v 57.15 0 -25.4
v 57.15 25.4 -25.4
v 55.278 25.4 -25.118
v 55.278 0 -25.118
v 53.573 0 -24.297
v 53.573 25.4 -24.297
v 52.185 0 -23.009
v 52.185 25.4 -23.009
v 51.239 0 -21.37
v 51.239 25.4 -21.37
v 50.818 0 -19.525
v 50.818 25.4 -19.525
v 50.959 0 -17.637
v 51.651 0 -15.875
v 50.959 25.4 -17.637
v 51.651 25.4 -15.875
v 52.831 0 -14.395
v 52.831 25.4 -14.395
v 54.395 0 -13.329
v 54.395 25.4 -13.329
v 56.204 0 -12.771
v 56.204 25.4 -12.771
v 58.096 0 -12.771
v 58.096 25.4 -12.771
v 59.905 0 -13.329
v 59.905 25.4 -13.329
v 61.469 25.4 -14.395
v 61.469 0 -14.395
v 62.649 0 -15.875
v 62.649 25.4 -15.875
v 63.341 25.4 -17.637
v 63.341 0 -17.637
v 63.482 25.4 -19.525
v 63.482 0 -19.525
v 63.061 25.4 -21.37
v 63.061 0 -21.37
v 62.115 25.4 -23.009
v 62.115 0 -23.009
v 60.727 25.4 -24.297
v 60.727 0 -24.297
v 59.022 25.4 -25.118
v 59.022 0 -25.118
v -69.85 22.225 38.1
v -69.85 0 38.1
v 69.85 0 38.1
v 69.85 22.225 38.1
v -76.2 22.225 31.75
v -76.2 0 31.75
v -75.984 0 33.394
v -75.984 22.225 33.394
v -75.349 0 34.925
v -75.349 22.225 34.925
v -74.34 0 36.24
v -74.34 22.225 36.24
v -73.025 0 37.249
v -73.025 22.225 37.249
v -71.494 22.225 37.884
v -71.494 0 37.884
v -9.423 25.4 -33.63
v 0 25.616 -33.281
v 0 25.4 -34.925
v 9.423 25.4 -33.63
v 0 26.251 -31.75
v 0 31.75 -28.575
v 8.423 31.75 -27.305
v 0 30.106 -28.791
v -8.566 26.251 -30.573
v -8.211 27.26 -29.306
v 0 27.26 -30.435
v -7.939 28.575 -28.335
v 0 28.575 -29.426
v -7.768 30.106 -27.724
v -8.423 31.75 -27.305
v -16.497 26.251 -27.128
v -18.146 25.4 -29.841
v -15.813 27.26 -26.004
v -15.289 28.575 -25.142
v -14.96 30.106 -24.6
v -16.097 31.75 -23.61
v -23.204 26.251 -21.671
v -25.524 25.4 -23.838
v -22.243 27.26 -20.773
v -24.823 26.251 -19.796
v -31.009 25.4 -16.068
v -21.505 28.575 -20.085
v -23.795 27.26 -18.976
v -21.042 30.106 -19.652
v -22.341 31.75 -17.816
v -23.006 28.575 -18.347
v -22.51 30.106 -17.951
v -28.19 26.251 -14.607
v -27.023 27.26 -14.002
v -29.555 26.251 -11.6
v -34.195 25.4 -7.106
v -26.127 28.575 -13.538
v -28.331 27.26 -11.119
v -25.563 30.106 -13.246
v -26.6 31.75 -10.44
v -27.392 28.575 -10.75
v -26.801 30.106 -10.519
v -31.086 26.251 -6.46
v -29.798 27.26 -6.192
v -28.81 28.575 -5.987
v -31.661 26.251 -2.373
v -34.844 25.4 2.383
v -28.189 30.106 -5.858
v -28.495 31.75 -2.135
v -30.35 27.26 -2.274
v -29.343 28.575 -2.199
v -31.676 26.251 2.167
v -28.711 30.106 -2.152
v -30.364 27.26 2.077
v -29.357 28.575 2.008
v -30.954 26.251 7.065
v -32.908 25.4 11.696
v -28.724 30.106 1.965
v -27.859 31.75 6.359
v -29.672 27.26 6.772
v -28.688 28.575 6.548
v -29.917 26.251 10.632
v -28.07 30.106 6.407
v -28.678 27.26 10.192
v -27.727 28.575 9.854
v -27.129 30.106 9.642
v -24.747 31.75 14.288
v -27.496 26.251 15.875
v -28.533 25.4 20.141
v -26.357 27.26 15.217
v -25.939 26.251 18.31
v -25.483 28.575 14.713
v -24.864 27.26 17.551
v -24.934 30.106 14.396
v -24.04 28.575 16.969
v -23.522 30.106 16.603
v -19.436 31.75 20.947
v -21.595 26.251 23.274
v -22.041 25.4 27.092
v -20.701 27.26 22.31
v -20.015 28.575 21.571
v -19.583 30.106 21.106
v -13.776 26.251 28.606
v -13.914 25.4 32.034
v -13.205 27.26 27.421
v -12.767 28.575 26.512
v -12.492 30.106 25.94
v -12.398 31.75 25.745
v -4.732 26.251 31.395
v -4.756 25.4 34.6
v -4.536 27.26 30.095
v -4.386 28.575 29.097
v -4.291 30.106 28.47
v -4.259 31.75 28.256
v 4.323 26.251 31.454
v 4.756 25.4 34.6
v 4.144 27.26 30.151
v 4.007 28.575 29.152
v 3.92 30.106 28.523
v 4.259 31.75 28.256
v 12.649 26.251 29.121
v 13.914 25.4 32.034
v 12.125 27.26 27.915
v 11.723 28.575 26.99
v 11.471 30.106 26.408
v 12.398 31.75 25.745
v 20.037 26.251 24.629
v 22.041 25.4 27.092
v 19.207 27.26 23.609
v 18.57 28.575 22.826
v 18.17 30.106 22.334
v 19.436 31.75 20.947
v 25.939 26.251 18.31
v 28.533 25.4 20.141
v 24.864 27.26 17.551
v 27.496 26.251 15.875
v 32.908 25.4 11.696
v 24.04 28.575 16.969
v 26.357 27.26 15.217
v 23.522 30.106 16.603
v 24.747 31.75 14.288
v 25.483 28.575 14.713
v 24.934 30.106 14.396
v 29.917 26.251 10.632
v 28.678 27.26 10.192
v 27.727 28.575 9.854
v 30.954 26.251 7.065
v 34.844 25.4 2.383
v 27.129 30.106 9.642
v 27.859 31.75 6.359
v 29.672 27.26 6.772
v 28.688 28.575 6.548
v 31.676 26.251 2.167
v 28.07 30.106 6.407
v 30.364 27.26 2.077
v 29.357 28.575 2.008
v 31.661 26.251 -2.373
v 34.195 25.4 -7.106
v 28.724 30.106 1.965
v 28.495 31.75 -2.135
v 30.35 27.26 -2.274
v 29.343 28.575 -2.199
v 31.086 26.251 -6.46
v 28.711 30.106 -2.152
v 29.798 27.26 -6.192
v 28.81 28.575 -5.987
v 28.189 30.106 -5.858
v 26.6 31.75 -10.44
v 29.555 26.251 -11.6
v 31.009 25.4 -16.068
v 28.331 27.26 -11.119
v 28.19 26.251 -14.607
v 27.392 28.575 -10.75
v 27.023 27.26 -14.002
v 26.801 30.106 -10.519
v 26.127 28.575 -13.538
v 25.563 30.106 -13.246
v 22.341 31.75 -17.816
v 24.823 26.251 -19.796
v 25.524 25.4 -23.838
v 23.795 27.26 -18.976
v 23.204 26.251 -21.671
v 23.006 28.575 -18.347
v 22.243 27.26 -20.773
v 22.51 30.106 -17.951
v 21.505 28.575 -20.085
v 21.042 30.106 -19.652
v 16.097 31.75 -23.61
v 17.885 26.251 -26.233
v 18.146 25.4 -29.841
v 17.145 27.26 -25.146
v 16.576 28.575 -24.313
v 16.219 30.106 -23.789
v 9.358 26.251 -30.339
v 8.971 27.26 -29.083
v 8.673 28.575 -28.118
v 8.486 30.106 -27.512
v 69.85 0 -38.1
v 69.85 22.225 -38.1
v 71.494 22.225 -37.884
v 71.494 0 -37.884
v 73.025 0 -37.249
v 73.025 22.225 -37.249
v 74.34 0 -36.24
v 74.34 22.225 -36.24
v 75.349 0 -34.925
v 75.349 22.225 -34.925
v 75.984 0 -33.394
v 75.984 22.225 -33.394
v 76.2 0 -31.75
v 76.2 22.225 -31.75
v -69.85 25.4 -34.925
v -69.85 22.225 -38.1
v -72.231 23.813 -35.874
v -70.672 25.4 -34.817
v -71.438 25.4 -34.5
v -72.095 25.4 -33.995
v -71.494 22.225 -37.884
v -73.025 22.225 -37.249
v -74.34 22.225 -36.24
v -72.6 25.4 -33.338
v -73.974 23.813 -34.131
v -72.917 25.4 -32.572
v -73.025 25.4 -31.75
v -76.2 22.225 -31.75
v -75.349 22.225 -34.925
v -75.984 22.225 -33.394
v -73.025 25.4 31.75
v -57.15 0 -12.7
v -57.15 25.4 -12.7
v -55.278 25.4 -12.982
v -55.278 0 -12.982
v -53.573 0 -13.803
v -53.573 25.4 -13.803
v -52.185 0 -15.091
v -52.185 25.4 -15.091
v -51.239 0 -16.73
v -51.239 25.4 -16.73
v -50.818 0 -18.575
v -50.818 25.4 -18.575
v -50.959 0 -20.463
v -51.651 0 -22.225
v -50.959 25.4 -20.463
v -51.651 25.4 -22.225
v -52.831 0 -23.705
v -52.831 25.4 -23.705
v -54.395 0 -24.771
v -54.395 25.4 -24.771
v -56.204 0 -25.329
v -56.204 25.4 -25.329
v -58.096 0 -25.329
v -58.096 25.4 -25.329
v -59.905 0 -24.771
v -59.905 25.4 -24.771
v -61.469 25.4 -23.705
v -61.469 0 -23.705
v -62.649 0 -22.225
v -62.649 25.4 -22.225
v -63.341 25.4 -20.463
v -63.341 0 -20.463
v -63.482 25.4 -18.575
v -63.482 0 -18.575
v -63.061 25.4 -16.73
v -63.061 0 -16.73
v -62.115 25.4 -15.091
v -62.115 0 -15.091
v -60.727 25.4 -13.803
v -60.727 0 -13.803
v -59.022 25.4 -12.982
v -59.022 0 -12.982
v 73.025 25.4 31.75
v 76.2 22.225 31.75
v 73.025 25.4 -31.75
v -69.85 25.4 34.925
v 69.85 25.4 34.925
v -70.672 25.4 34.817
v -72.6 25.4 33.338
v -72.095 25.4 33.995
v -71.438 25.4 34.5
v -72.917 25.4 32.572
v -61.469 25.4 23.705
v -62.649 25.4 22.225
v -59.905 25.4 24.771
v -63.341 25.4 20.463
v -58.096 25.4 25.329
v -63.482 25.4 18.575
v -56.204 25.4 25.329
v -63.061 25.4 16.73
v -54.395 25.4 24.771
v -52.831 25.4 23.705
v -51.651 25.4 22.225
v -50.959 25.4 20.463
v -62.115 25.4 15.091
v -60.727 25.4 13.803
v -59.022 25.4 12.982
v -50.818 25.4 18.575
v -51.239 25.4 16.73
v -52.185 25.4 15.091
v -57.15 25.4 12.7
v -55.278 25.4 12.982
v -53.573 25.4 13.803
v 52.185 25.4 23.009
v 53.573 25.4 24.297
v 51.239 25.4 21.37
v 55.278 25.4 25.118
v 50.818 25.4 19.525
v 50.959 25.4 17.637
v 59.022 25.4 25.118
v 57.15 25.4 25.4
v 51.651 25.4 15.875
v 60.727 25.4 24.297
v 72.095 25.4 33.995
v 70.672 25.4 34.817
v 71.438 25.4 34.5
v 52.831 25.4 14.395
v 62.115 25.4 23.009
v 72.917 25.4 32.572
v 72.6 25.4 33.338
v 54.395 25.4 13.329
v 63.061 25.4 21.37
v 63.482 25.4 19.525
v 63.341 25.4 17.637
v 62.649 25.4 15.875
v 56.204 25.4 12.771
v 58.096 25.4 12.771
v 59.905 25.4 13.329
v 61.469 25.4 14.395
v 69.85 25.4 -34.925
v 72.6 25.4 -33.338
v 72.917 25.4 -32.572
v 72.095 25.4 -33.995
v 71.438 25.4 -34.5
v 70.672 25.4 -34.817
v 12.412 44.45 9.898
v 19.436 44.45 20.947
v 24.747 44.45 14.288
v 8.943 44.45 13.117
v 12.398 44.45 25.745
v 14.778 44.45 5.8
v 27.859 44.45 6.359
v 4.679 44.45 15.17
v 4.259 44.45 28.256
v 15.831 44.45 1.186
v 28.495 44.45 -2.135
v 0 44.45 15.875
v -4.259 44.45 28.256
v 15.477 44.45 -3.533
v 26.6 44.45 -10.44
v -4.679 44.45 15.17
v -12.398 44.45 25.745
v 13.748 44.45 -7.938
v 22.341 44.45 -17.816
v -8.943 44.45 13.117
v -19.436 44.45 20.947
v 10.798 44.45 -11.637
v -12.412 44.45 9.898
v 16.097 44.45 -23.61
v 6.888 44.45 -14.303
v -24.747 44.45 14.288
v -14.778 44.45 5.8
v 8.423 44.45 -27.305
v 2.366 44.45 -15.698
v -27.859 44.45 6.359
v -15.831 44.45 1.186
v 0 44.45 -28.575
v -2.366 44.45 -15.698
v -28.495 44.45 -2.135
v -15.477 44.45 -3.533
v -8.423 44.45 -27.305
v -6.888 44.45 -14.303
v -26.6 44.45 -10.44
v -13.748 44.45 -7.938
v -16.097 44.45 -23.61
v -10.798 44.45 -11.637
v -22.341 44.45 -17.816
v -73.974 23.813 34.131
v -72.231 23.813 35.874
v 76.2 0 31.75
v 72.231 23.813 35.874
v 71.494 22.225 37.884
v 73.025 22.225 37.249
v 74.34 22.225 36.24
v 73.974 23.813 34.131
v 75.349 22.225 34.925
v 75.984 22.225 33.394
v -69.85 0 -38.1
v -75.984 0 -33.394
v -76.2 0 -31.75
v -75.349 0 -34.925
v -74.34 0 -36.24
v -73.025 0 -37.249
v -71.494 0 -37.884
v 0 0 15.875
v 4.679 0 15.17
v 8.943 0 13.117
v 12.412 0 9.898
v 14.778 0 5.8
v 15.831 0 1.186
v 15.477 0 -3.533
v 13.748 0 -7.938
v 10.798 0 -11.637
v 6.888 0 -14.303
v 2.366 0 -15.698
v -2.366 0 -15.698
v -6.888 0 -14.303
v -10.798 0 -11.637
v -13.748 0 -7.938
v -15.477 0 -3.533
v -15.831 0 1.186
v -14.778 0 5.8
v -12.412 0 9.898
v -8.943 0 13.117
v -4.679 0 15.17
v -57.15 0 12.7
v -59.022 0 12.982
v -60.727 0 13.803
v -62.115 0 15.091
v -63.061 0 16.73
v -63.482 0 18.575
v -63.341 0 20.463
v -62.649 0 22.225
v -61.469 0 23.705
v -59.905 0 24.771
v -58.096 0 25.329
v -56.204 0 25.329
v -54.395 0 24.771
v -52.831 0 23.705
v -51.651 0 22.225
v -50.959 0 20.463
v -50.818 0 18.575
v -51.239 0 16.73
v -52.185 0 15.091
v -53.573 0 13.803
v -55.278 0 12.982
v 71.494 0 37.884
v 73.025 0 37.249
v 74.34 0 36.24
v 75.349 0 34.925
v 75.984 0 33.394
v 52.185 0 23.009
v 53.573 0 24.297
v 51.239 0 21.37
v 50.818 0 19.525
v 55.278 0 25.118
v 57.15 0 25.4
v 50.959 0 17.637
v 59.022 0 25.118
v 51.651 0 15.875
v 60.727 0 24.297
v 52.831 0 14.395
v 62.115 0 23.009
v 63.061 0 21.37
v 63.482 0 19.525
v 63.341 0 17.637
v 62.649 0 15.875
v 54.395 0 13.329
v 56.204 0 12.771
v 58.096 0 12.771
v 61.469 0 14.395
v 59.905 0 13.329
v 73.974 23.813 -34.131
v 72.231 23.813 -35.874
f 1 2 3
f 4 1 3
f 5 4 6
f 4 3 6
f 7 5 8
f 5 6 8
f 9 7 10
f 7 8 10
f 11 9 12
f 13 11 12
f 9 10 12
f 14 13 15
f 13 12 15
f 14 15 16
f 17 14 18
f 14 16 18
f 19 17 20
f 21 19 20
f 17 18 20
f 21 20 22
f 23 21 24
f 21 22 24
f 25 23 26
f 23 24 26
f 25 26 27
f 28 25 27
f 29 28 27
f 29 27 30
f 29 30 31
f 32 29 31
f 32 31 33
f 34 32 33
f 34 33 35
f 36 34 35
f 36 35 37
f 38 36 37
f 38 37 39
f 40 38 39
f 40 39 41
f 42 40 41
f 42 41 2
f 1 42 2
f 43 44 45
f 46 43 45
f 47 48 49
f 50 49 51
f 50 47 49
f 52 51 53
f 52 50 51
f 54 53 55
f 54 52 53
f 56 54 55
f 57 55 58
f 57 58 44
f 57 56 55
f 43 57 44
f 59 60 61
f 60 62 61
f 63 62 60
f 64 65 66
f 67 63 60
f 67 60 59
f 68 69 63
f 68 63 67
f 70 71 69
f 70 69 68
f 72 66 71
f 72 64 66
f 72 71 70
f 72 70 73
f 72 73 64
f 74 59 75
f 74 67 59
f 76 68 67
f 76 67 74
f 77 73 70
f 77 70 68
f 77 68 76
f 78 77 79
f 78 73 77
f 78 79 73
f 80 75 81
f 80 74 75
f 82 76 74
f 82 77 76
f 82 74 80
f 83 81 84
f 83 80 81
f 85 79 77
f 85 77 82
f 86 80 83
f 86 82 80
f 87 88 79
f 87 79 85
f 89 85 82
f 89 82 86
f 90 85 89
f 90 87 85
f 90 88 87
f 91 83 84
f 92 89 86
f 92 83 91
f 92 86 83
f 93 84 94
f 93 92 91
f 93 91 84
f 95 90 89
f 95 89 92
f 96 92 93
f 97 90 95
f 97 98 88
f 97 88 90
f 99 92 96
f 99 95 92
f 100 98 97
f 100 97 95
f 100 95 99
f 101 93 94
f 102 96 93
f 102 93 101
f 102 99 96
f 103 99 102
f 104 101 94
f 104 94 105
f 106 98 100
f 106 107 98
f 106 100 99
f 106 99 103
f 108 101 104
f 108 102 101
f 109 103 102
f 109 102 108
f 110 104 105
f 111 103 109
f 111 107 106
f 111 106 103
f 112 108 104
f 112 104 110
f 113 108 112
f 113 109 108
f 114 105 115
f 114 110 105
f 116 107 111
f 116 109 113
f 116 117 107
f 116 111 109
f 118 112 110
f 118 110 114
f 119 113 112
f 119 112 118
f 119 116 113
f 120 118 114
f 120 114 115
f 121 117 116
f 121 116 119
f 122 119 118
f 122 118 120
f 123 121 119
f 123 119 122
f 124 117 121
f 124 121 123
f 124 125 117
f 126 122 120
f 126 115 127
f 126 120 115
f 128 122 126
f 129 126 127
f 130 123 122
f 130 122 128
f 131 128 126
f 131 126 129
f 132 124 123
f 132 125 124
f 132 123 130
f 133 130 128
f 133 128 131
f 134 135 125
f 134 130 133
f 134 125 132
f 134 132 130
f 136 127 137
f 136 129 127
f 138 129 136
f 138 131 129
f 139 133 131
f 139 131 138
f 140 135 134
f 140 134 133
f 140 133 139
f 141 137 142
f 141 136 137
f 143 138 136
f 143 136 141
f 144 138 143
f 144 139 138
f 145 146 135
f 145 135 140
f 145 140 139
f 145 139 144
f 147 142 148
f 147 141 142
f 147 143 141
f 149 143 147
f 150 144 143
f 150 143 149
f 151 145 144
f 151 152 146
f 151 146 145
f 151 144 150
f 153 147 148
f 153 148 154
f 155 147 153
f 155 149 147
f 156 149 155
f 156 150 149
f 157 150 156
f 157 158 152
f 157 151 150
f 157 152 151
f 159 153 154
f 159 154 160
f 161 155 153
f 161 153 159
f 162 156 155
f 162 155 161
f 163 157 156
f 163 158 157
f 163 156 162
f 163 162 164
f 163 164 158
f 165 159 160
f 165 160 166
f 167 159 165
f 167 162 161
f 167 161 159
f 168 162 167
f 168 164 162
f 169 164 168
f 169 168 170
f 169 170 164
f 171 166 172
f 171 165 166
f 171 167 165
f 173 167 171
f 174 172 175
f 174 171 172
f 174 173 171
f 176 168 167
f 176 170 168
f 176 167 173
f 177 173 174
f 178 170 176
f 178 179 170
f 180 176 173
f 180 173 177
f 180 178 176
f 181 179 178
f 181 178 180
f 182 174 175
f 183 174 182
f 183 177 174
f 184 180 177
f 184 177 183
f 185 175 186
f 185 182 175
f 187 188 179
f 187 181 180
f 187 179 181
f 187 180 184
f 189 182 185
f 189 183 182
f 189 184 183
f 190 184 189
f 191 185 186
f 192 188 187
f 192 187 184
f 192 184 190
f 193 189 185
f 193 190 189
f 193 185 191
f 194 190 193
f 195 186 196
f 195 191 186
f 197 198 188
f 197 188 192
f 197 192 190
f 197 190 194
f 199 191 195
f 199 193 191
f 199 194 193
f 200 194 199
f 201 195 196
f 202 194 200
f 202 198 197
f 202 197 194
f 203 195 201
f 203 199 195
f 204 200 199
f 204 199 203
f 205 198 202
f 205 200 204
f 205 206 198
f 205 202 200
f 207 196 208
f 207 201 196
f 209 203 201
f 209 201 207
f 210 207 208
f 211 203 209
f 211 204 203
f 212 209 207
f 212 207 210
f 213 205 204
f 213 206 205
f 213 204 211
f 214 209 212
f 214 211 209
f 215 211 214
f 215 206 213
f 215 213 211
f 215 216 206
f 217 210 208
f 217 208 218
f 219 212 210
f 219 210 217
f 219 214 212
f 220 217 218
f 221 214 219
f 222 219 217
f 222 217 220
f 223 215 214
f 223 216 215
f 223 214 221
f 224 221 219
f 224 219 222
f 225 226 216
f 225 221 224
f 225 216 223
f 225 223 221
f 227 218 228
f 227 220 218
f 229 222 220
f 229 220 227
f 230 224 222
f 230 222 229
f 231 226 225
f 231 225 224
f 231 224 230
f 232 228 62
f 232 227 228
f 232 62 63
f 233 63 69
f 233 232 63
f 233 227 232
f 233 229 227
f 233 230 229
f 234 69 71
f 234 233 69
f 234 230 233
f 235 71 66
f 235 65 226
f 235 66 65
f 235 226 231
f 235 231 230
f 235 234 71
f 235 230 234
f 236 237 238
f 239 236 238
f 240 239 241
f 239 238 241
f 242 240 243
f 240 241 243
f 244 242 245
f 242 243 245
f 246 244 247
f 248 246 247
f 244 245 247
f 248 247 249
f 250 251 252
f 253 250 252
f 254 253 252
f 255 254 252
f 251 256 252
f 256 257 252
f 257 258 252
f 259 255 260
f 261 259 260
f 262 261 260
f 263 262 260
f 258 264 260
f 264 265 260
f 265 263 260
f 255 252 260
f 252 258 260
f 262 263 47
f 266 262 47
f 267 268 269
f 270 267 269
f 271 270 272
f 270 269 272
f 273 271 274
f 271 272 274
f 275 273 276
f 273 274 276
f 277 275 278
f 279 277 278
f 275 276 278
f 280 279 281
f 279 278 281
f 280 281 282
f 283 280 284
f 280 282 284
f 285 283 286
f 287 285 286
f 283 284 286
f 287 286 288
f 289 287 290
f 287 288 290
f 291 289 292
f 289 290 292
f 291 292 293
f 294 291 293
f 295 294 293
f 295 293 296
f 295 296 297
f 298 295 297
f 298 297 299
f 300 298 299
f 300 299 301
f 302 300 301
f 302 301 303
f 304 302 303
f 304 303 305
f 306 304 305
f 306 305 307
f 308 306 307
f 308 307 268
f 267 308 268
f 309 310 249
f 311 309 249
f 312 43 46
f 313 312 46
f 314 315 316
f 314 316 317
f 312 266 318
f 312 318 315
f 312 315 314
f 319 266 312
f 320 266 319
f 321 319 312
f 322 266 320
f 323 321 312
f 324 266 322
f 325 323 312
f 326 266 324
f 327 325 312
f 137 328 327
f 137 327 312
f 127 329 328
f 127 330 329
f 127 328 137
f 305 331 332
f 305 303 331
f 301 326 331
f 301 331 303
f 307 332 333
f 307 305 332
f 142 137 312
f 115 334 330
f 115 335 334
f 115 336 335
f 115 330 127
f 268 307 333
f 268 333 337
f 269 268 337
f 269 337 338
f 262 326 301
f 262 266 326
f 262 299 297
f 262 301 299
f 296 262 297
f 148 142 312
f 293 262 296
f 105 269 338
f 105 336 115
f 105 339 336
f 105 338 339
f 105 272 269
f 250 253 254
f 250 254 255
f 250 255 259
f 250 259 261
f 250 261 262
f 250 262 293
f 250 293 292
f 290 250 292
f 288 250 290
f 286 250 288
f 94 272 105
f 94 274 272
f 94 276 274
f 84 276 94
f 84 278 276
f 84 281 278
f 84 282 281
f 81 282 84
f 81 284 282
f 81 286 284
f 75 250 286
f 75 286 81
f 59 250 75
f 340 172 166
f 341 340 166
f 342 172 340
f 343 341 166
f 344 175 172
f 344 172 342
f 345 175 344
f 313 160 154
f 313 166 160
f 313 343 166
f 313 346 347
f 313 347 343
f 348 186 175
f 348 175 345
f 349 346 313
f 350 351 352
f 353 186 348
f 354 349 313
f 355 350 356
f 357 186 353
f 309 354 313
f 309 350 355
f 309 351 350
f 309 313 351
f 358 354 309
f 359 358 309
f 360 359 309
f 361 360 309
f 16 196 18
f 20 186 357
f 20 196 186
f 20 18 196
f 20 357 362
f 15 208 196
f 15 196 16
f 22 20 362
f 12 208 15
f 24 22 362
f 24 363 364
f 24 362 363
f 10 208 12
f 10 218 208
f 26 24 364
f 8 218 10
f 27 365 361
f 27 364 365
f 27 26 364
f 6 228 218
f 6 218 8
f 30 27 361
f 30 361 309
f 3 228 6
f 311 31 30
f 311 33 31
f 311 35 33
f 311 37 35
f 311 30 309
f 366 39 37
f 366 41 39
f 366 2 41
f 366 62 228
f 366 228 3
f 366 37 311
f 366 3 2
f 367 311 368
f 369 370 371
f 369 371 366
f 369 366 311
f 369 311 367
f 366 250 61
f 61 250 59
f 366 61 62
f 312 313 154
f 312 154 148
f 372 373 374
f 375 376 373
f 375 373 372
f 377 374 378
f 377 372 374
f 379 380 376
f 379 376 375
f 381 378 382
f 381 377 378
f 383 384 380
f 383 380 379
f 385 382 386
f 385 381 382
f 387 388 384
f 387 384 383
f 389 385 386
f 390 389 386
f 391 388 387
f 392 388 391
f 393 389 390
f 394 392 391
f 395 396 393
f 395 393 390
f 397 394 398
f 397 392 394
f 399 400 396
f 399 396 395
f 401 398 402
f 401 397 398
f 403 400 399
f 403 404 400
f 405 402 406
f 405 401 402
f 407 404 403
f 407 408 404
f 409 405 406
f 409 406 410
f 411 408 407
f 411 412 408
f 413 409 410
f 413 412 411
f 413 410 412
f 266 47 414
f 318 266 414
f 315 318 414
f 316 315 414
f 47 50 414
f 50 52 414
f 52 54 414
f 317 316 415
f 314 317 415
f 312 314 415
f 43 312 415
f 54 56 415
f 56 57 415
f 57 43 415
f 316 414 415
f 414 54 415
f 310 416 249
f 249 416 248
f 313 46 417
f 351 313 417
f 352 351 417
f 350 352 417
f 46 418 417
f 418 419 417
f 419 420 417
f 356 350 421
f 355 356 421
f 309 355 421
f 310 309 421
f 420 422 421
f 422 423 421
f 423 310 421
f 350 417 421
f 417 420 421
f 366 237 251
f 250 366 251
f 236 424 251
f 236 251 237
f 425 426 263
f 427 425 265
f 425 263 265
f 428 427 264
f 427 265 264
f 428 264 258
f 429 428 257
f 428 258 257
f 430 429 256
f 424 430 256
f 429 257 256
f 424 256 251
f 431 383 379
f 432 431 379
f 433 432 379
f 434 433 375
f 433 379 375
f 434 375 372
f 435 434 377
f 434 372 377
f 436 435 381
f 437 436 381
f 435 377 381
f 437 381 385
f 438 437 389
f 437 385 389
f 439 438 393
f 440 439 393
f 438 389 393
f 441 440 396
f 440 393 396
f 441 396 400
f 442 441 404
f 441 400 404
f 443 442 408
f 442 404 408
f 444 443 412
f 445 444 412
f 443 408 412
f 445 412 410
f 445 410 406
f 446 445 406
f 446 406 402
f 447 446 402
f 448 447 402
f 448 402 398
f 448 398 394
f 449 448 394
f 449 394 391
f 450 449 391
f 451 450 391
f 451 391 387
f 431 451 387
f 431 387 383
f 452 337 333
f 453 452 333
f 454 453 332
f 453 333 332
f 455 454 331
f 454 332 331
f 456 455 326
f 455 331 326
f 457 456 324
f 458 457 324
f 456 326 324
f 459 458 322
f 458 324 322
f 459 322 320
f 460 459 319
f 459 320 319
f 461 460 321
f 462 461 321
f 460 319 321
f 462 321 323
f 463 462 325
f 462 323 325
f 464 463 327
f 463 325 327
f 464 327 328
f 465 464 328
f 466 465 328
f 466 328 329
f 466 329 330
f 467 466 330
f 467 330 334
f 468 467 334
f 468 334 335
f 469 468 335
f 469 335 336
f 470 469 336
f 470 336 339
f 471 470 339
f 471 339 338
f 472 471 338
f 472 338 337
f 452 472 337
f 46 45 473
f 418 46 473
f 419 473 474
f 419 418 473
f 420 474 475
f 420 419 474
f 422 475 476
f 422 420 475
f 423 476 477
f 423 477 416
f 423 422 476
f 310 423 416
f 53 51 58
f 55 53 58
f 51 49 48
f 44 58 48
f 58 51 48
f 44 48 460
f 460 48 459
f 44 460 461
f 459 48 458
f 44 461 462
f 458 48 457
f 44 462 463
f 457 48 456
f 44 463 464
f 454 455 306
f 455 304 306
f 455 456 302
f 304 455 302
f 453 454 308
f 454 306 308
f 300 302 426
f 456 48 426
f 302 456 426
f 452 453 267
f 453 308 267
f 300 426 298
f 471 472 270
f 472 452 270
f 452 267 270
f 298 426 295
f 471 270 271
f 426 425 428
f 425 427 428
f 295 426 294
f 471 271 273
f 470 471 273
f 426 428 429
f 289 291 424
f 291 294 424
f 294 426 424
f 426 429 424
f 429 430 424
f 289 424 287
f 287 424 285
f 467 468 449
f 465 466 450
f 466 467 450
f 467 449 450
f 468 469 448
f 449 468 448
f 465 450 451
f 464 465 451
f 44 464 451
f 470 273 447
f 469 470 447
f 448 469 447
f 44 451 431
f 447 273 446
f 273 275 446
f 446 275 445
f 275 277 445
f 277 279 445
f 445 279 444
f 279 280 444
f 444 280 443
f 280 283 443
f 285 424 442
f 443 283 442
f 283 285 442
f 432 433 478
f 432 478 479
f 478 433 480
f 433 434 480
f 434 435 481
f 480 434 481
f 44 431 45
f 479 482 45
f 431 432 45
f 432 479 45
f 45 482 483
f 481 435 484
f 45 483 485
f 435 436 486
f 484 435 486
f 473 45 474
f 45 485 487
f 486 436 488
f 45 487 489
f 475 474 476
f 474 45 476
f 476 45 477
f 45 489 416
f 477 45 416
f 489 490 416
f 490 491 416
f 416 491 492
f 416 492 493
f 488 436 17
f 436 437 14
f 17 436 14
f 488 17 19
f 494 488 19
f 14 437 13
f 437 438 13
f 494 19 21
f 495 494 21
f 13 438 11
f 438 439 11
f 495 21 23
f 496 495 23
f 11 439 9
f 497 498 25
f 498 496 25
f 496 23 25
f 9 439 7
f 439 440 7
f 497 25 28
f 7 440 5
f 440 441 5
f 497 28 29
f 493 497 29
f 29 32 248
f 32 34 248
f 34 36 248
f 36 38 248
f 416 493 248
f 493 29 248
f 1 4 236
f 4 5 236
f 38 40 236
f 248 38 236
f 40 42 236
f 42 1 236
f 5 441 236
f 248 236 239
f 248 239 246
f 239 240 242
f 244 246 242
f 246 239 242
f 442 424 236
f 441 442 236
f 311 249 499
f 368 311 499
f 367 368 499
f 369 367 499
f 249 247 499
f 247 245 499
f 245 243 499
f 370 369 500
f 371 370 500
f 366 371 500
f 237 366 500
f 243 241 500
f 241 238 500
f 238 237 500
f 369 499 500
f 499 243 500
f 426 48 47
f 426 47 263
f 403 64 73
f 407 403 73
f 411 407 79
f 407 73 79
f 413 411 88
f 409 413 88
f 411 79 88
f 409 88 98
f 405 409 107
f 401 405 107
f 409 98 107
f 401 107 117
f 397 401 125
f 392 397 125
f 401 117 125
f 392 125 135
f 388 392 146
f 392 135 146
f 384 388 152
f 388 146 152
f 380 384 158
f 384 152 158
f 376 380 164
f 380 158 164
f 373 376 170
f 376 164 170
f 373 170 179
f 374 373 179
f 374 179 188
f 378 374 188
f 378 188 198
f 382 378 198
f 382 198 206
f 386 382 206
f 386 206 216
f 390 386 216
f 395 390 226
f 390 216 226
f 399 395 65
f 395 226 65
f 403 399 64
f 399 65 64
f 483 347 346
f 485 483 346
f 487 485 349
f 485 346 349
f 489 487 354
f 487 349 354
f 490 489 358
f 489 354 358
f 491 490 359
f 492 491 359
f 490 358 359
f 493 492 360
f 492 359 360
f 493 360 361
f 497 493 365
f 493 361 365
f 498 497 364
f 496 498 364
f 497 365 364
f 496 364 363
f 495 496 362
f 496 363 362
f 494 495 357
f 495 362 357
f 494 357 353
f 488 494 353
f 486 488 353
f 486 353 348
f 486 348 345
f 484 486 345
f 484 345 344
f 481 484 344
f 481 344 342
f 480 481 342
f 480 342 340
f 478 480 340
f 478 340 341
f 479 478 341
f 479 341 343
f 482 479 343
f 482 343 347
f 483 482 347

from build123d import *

# Parameters (mm, degrees)
SKETCH1_W           = 152.4
SKETCH1_H           = 76.2
BOSS_EXTRUDE1_DEPTH = 25.4
SKETCH2_R           = 6.35
CUT_EXTRUDE1_DEPTH  = 89.9
SKETCH3_R           = 28.575
BOSS_EXTRUDE2_DEPTH = 19.05
SKETCH4_R           = 15.875
CUT_EXTRUDE3_DEPTH  = 97.092936785
FILLET1_R           = 6.35
CHAMFER1_SIZE       = 3.175


with BuildPart() as part:
    # Sketch1 → Boss-Extrude1 (new body)
    with BuildSketch(Plane(origin=(0, 0, 0), x_dir=(1, 0, 0), z_dir=(0, 1, 0))):
        Rectangle(SKETCH1_W, SKETCH1_H)
    extrude(amount=BOSS_EXTRUDE1_DEPTH)

    # Sketch2 → Cut-Extrude1 (cut, through all)
    with BuildSketch(Plane(origin=(0, 25.4, 0), x_dir=(1, 0, 0), z_dir=(0, 1, 0))):
        with Locations(Location((-57.15, 19.05, 0), (0, 0, 270))):
            Circle(SKETCH2_R)
        with Locations(Location((-57.15, -19.05, 0), (0, 0, 90))):
            Circle(SKETCH2_R)
        with Locations(Location((57.15, -19.05, 0), (0, 0, 270))):
            Circle(SKETCH2_R)
        with Locations(Location((57.15, 19.05, 0), (0, 0, 90))):
            Circle(SKETCH2_R)
    extrude(amount=-CUT_EXTRUDE1_DEPTH, mode=Mode.SUBTRACT)

    # Sketch3 → Boss-Extrude2 (add)
    with BuildSketch(Plane(origin=(0, 25.4, 0), x_dir=(1, 0, 0), z_dir=(0, 1, 0))):
        with Locations(Location((0, 0, 0), (0, 0, 90))):
            Circle(SKETCH3_R)
    extrude(amount=BOSS_EXTRUDE2_DEPTH)

    # Sketch4 → Cut-Extrude3 (cut, through all)
    with BuildSketch(Plane(origin=(0, 44.45, 0), x_dir=(1, 0, 0), z_dir=(0, 1, 0))):
        with Locations(Location((0, 0, 0), (0, 0, 270))):
            Circle(SKETCH4_R)
    extrude(amount=-CUT_EXTRUDE3_DEPTH, mode=Mode.SUBTRACT)

    # Fillet1
    fillet1_edges = [part.edges().sort_by_distance(p)[0] for p in [
        (0, 25.4, 28.575),
        (76.2, 12.7, 38.1),
        (-76.2, 12.7, 38.1),
        (-76.2, 12.7, -38.1),
        (76.2, 12.7, -38.1),
    ]]
    fillet(fillet1_edges, radius=FILLET1_R)

    # Chamfer1
    chamfer1_edges = [part.edges().sort_by_distance(p)[0] for p in [
        (76.2, 25.4, 0),
        (0, 25.4, -38.1),
        (-76.2, 25.4, 0),
        (0, 25.4, 38.1),
        (-74.340128061, 25.4, 36.240128061),
        (74.340128061, 25.4, 36.240128061),
        (74.340128061, 25.4, -36.240128061),
        (-74.340128061, 25.4, -36.240128061),
    ]]
    chamfer(chamfer1_edges, length=CHAMFER1_SIZE - 0.0001)  # a hair under: the kernel refuses the full size


solid = part.part
